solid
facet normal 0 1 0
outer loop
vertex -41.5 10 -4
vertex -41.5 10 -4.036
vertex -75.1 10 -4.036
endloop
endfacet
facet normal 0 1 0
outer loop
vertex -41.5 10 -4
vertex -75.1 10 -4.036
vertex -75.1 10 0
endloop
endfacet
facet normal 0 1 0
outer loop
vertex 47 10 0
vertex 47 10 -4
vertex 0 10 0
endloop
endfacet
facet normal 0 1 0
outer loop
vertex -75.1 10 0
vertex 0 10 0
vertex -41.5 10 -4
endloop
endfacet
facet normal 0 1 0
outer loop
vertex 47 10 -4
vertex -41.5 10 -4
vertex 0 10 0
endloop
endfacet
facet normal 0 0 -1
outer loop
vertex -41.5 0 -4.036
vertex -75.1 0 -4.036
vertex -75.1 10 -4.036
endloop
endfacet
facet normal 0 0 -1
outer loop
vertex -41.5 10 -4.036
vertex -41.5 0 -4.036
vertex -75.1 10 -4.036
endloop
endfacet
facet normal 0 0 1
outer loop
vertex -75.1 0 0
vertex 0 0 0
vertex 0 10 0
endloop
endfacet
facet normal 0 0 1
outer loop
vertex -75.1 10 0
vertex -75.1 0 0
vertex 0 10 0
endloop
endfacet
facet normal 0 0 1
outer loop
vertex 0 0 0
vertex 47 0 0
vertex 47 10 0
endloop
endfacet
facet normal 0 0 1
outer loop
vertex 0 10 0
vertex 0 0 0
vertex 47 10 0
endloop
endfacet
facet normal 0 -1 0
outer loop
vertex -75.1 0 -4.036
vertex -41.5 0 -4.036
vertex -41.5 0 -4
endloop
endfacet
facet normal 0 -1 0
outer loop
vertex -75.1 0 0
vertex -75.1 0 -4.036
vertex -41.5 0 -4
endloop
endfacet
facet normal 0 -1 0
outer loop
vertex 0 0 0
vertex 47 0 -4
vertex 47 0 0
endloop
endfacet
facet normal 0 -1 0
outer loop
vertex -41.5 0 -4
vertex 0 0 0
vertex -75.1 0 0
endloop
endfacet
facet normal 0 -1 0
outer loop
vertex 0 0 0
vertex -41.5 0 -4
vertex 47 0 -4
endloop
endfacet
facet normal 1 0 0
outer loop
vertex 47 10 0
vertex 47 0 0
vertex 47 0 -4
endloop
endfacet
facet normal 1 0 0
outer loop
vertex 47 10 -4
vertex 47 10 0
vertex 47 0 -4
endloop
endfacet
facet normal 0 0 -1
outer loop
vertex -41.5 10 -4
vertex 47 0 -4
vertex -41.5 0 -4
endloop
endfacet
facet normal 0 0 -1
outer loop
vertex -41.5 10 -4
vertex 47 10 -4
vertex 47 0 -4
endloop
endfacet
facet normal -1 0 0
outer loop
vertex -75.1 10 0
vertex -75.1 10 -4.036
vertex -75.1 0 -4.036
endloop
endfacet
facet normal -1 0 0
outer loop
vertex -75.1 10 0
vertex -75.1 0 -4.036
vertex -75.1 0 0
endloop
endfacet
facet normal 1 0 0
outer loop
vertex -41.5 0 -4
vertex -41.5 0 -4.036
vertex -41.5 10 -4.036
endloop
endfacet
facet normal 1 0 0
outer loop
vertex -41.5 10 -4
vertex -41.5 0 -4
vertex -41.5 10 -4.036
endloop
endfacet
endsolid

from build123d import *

# Parameters (mm, degrees)
SKETCH1_W           = 47
SKETCH1_H           = 22
BOSS_EXTRUDE1_DEPTH = 10
SKETCH2_W           = 4.035688101
SKETCH2_H           = 10
BOSS_EXTRUDE2_DEPTH = 75.1
SKETCH5_W           = 120.095594562
SKETCH5_H           = 66.646456322
CUT_EXTRUDE1_DEPTH  = 18


with BuildPart() as part:
    # Sketch1 → Boss-Extrude1 (new body)
    with BuildSketch(Plane(origin=(0, 0, 0), x_dir=(1, 0, 0), z_dir=(0, 1, 0))):
        with Locations((23.5, 11)):
            Rectangle(SKETCH1_W, SKETCH1_H)
    extrude(amount=BOSS_EXTRUDE1_DEPTH)

    # Sketch2 → Boss-Extrude2 (add)
    with BuildSketch(Plane.ZY):
        with Locations((-2.01784405, 5)):
            Rectangle(SKETCH2_W, SKETCH2_H)
    extrude(amount=BOSS_EXTRUDE2_DEPTH)

    # Sketch5 → Cut-Extrude1 (cut)
    with BuildSketch(Plane(origin=(0, 0, -22), x_dir=(-1, 0, 0), z_dir=(0, 0, -1))):
        with Locations((-18.547375667, 4.208160915)):
            Rectangle(SKETCH5_W, SKETCH5_H)
    extrude(amount=-CUT_EXTRUDE1_DEPTH, mode=Mode.SUBTRACT)


solid = part.part
